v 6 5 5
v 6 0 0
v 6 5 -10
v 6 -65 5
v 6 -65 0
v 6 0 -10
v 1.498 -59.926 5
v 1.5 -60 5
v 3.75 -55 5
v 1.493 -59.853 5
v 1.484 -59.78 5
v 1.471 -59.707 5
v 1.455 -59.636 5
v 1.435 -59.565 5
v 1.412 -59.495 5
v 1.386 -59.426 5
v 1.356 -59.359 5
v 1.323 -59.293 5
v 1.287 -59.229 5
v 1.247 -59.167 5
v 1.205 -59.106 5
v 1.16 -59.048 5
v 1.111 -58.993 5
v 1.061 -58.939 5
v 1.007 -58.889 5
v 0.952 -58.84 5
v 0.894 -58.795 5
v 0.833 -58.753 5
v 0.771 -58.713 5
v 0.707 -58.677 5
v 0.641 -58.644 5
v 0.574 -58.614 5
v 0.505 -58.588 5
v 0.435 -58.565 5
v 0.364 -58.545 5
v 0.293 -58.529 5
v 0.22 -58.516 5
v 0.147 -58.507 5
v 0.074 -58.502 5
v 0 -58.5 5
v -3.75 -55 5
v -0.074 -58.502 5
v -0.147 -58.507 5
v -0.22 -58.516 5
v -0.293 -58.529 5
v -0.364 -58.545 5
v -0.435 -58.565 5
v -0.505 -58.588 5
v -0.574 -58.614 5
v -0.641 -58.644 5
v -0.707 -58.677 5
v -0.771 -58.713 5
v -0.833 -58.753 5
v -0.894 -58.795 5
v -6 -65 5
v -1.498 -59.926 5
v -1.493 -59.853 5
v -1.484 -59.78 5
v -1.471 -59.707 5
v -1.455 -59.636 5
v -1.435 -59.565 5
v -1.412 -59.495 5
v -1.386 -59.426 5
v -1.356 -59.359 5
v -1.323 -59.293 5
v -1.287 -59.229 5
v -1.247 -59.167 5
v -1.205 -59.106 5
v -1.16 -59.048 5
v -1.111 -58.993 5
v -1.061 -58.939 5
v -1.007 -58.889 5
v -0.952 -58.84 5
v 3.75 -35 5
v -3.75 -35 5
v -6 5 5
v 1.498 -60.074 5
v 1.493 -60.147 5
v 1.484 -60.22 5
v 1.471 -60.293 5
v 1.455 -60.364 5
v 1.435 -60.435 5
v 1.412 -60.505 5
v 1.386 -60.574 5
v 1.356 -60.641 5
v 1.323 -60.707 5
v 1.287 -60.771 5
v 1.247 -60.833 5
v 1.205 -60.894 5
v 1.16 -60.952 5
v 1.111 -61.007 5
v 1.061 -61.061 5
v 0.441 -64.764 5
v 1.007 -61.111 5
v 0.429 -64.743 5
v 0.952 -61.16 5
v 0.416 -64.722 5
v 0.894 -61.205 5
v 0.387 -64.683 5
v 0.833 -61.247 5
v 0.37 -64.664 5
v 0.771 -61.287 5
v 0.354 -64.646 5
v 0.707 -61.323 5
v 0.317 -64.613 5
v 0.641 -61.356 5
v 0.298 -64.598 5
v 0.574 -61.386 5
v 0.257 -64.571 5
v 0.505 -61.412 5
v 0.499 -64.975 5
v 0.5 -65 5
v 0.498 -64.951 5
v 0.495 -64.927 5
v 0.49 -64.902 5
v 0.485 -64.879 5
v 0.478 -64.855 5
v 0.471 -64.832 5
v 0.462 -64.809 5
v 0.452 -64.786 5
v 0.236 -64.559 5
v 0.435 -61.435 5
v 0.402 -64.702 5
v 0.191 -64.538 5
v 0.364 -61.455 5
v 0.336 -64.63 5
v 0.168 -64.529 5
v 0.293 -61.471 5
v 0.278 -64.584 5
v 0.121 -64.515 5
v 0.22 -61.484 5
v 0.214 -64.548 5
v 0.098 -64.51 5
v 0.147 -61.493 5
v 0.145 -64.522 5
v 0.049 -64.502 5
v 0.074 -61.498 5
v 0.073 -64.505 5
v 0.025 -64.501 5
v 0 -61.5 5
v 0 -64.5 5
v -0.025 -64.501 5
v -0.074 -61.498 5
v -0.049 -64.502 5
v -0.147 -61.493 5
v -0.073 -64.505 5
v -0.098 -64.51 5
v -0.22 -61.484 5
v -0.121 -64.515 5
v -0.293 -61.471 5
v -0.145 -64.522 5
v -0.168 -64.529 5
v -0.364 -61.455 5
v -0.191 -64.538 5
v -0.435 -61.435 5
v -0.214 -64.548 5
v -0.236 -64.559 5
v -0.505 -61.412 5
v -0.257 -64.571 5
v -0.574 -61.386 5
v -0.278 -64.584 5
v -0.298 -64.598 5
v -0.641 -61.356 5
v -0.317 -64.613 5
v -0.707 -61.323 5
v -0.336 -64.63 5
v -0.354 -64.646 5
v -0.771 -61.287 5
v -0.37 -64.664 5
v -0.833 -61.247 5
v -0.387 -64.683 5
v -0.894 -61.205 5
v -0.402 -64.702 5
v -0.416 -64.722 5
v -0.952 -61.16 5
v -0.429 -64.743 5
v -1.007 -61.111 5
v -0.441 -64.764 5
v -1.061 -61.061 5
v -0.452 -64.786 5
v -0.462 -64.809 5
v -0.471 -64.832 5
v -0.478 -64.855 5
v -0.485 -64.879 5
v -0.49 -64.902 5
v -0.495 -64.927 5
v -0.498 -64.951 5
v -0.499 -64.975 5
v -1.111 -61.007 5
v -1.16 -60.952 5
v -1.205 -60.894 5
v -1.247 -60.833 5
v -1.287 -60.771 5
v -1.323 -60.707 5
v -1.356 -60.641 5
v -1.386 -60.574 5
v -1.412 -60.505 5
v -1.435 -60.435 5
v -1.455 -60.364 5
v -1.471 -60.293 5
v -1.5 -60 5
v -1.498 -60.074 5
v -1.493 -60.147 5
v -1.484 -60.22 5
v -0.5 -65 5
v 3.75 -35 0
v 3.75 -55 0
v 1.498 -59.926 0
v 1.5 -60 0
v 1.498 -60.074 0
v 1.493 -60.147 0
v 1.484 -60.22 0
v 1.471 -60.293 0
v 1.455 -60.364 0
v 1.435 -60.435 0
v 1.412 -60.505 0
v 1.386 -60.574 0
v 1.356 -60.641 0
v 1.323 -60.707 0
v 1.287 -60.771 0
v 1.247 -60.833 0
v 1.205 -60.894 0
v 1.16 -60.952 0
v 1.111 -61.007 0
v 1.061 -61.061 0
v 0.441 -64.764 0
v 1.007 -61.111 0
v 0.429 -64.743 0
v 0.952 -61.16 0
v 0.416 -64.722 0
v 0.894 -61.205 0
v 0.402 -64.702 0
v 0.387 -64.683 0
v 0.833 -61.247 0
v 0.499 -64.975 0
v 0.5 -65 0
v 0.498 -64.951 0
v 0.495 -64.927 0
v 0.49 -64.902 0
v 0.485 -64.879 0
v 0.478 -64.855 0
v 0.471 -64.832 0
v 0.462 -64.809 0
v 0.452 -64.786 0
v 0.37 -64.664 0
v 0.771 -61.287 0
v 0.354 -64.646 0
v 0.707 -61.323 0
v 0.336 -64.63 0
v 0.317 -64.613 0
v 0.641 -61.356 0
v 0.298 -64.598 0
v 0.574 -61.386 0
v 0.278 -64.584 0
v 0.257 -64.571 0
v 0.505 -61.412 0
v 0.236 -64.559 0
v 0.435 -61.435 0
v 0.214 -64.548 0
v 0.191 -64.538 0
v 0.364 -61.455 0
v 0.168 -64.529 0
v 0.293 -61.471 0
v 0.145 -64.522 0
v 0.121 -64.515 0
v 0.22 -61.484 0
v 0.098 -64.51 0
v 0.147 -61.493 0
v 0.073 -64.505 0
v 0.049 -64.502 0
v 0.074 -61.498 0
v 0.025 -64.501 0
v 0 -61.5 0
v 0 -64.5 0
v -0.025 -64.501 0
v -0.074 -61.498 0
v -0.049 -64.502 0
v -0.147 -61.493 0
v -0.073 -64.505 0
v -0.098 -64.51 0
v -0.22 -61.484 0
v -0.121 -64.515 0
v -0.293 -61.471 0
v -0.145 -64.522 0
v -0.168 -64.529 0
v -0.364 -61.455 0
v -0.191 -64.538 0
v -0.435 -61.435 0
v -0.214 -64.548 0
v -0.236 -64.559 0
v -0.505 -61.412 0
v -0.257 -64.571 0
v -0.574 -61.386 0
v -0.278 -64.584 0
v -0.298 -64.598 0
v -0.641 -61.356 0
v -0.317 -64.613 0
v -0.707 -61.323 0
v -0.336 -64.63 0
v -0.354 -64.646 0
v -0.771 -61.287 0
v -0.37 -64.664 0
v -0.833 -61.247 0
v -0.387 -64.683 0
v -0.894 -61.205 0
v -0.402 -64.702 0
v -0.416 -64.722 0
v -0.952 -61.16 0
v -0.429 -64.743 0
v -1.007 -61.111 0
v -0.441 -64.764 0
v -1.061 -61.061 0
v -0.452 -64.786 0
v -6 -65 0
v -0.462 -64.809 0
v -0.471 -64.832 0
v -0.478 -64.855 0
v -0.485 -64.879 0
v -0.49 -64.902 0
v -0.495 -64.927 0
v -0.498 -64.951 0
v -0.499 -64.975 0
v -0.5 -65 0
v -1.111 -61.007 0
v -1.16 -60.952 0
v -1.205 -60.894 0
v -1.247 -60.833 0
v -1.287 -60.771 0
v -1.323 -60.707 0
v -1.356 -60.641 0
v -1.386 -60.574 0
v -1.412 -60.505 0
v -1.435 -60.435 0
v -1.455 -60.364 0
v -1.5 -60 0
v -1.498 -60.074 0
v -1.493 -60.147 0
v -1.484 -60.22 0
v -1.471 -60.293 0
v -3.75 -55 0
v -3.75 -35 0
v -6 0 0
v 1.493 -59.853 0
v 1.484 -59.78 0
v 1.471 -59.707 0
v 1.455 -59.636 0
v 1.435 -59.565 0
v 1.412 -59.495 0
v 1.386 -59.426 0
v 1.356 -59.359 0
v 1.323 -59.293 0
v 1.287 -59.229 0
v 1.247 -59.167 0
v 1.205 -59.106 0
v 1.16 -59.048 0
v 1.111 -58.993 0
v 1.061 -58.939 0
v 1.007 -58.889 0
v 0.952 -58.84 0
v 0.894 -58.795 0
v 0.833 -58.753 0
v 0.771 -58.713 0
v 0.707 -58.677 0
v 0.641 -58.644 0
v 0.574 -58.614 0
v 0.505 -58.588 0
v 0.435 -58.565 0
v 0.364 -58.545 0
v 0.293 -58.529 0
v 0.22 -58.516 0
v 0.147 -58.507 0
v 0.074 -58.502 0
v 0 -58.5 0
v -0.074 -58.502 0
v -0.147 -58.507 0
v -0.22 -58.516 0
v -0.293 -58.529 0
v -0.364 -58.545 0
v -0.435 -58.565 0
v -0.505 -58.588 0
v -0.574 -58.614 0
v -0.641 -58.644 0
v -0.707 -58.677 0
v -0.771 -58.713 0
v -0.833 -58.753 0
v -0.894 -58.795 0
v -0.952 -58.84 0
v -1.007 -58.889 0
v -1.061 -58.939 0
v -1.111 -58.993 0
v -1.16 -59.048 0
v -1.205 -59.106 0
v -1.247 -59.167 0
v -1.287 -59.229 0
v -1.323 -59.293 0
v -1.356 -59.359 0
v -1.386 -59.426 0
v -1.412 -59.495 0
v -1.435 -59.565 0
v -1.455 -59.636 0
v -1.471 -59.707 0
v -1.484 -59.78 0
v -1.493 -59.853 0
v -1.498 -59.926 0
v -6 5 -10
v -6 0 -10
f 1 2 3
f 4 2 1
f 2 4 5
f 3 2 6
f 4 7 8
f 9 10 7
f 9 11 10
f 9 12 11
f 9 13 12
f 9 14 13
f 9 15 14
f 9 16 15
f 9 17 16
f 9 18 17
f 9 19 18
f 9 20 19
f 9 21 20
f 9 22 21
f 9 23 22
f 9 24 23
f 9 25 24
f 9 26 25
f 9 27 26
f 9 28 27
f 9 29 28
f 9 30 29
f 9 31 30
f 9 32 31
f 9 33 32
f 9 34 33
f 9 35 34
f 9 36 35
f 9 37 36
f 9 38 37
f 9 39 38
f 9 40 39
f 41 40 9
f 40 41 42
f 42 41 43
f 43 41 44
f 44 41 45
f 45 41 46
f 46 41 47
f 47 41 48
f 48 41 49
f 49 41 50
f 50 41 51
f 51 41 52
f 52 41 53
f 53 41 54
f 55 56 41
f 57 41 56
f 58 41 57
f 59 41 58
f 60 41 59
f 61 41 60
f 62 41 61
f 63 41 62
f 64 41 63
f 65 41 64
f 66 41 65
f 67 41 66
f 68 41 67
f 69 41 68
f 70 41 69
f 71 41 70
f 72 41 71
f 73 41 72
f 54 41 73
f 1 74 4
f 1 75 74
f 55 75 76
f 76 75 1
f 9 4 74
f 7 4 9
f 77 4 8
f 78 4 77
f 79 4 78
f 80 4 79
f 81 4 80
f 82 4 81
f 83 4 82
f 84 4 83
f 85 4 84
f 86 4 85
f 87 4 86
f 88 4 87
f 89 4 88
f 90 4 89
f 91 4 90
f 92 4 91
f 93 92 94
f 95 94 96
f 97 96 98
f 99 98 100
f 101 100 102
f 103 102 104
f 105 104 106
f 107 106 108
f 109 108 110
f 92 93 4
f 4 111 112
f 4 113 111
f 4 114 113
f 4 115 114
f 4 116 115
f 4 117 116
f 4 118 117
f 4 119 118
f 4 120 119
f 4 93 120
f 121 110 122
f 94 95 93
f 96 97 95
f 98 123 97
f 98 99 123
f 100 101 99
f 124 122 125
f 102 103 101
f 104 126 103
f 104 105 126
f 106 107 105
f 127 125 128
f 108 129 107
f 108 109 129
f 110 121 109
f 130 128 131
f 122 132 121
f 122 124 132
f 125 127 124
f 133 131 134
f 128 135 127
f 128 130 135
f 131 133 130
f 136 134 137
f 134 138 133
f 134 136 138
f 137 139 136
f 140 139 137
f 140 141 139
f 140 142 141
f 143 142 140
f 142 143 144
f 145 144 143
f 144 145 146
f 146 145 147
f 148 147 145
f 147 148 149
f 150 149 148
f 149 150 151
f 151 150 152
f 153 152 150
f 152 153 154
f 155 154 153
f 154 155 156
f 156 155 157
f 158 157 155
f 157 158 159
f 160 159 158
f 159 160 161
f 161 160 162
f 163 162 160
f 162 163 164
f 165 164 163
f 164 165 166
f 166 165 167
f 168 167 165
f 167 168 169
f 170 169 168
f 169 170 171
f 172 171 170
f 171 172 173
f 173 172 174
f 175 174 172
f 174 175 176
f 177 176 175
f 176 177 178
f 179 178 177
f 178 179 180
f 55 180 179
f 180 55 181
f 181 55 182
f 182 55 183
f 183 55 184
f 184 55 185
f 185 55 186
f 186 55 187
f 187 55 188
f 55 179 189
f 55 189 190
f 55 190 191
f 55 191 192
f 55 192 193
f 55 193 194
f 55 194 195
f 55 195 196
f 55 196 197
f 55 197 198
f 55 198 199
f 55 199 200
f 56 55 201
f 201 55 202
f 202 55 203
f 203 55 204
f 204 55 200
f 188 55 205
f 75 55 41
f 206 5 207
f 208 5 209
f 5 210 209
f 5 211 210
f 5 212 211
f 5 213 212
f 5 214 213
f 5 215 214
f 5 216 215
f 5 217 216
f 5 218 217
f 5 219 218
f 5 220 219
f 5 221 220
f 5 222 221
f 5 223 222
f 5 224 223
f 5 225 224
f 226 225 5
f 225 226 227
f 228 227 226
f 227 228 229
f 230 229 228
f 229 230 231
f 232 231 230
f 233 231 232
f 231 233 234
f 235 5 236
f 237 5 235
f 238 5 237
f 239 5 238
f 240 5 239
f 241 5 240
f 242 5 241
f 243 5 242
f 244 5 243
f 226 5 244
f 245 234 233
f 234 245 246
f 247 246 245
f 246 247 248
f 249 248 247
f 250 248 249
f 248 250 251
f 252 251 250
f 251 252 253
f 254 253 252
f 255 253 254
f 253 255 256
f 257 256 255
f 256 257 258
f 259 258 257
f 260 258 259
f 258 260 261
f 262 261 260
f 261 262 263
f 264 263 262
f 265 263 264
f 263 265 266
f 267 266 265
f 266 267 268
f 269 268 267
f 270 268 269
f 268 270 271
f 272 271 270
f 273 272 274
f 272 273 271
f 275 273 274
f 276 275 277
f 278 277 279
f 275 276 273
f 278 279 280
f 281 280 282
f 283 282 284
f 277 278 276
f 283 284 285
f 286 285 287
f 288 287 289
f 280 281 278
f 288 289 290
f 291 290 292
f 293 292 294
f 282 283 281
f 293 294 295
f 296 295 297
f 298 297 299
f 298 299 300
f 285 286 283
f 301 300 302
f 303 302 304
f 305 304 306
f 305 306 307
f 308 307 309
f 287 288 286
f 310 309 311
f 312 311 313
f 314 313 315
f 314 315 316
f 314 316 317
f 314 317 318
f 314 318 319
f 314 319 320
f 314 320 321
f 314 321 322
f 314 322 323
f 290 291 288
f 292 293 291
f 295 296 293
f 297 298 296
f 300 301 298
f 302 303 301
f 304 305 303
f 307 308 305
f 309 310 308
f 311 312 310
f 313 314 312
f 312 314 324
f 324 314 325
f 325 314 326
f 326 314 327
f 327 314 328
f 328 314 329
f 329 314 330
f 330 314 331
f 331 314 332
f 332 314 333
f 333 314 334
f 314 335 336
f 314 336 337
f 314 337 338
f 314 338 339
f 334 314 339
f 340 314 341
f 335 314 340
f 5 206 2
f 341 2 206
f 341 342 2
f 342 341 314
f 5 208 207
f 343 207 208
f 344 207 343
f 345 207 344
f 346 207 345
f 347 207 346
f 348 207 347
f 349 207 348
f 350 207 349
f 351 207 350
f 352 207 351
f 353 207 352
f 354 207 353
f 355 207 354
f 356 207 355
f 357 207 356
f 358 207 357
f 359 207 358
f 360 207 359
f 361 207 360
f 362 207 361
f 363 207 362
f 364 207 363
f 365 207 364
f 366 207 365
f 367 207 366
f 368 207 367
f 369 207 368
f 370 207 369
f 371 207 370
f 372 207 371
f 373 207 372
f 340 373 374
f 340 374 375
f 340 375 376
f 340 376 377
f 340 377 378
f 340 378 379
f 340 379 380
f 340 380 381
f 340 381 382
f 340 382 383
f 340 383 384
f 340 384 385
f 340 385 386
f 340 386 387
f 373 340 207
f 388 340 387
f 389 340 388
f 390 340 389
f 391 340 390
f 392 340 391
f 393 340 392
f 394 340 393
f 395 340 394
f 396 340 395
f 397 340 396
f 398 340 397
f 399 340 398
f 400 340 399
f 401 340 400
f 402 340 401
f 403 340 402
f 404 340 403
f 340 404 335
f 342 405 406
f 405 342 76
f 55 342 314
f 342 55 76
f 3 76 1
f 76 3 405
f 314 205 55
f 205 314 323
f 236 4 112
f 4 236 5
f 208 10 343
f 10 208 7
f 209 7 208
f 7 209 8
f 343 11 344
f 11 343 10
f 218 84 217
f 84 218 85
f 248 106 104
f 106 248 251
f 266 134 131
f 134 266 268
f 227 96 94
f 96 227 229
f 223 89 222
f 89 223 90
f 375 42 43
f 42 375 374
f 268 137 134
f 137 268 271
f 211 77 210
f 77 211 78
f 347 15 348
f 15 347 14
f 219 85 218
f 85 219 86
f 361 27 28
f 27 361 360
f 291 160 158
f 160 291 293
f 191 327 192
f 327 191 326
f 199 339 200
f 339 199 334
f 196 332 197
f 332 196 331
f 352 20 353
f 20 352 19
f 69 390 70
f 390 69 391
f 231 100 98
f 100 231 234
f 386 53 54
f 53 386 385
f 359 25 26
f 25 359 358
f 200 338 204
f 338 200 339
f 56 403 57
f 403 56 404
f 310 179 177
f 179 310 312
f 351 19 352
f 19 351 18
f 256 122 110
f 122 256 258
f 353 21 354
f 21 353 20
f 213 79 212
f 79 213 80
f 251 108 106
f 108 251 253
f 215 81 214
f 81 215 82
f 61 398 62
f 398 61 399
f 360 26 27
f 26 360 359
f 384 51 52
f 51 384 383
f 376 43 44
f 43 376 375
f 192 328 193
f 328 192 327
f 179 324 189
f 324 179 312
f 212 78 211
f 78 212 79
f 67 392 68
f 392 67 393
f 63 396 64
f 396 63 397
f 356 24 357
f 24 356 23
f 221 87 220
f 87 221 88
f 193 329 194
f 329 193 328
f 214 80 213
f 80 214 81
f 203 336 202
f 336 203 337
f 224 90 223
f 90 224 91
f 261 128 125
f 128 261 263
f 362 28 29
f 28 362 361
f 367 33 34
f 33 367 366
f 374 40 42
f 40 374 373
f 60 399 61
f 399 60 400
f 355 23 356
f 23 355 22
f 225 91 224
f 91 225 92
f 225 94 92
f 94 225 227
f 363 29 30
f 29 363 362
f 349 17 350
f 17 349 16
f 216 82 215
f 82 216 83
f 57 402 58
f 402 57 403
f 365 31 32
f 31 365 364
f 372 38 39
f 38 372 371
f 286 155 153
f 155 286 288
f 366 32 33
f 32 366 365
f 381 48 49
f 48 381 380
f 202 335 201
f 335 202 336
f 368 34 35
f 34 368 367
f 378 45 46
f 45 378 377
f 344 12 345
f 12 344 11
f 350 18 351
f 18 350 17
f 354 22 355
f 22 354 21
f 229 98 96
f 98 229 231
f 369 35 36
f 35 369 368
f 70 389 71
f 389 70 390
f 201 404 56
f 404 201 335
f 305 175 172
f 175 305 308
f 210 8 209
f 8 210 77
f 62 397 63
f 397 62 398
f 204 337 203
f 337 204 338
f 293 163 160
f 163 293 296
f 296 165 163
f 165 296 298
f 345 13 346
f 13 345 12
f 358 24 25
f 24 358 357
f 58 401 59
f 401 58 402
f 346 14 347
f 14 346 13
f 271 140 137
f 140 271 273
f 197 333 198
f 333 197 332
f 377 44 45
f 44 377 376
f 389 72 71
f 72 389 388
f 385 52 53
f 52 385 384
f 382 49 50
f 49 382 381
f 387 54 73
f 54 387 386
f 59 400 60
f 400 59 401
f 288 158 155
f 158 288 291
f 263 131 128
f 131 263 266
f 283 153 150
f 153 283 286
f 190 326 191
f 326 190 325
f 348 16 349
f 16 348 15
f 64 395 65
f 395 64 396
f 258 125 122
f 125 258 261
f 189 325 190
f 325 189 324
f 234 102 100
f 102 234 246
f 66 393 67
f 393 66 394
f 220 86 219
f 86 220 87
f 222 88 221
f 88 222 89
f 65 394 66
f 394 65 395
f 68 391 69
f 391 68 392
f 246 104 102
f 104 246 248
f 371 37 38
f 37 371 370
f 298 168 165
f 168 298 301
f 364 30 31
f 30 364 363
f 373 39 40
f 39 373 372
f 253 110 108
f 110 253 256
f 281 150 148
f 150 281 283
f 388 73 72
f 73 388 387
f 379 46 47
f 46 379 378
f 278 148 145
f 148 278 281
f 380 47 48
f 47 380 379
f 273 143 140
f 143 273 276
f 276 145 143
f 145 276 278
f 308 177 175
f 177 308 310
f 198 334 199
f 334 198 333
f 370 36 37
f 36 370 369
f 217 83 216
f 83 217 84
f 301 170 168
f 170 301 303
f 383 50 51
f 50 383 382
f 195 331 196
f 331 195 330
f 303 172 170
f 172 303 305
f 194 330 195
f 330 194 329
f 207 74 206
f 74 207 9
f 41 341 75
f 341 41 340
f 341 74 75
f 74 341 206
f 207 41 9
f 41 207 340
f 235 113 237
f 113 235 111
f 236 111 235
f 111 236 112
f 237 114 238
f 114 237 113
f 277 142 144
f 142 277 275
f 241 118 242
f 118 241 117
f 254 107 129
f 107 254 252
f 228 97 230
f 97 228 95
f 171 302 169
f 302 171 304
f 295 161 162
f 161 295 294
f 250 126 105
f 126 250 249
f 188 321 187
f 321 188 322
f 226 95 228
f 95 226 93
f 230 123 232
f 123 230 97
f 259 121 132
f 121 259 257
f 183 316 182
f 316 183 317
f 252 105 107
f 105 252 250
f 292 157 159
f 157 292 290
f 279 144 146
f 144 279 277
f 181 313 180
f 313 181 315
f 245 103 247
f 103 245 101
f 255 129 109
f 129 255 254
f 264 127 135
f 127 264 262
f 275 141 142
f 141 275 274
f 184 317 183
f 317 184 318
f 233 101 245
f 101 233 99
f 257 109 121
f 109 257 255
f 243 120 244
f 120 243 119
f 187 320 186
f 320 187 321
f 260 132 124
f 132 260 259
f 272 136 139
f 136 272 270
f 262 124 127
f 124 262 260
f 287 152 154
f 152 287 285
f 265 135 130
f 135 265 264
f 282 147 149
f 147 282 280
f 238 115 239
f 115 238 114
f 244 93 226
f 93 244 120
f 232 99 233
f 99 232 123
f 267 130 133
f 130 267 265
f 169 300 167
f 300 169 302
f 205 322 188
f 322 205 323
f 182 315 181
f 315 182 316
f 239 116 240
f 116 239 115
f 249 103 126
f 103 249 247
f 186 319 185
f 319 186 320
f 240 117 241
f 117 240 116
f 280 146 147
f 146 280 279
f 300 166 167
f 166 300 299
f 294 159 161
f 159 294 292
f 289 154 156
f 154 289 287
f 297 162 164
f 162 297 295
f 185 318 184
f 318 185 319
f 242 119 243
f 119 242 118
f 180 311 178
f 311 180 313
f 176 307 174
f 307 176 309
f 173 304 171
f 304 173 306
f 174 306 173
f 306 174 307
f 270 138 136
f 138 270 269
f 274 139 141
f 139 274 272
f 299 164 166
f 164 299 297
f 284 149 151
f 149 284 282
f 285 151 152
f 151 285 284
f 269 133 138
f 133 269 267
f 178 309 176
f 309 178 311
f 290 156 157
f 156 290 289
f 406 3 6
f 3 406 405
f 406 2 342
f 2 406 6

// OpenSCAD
$fn = 128;

width = 12;

difference() {
    translate([-width/2, -65, 0])
    cube([width, 70, 5]);

    translate([0, -60, -1])
    cylinder(h=7, d=3);
    
    translate([-7.5/2, -55, -1])
    cube([7.5, 20, 7]);

    translate([0, -65, -1])
    cylinder(h=7, d=1);
}

translate([-width/2, 0, -10])
cube([width, 5, 15]);
